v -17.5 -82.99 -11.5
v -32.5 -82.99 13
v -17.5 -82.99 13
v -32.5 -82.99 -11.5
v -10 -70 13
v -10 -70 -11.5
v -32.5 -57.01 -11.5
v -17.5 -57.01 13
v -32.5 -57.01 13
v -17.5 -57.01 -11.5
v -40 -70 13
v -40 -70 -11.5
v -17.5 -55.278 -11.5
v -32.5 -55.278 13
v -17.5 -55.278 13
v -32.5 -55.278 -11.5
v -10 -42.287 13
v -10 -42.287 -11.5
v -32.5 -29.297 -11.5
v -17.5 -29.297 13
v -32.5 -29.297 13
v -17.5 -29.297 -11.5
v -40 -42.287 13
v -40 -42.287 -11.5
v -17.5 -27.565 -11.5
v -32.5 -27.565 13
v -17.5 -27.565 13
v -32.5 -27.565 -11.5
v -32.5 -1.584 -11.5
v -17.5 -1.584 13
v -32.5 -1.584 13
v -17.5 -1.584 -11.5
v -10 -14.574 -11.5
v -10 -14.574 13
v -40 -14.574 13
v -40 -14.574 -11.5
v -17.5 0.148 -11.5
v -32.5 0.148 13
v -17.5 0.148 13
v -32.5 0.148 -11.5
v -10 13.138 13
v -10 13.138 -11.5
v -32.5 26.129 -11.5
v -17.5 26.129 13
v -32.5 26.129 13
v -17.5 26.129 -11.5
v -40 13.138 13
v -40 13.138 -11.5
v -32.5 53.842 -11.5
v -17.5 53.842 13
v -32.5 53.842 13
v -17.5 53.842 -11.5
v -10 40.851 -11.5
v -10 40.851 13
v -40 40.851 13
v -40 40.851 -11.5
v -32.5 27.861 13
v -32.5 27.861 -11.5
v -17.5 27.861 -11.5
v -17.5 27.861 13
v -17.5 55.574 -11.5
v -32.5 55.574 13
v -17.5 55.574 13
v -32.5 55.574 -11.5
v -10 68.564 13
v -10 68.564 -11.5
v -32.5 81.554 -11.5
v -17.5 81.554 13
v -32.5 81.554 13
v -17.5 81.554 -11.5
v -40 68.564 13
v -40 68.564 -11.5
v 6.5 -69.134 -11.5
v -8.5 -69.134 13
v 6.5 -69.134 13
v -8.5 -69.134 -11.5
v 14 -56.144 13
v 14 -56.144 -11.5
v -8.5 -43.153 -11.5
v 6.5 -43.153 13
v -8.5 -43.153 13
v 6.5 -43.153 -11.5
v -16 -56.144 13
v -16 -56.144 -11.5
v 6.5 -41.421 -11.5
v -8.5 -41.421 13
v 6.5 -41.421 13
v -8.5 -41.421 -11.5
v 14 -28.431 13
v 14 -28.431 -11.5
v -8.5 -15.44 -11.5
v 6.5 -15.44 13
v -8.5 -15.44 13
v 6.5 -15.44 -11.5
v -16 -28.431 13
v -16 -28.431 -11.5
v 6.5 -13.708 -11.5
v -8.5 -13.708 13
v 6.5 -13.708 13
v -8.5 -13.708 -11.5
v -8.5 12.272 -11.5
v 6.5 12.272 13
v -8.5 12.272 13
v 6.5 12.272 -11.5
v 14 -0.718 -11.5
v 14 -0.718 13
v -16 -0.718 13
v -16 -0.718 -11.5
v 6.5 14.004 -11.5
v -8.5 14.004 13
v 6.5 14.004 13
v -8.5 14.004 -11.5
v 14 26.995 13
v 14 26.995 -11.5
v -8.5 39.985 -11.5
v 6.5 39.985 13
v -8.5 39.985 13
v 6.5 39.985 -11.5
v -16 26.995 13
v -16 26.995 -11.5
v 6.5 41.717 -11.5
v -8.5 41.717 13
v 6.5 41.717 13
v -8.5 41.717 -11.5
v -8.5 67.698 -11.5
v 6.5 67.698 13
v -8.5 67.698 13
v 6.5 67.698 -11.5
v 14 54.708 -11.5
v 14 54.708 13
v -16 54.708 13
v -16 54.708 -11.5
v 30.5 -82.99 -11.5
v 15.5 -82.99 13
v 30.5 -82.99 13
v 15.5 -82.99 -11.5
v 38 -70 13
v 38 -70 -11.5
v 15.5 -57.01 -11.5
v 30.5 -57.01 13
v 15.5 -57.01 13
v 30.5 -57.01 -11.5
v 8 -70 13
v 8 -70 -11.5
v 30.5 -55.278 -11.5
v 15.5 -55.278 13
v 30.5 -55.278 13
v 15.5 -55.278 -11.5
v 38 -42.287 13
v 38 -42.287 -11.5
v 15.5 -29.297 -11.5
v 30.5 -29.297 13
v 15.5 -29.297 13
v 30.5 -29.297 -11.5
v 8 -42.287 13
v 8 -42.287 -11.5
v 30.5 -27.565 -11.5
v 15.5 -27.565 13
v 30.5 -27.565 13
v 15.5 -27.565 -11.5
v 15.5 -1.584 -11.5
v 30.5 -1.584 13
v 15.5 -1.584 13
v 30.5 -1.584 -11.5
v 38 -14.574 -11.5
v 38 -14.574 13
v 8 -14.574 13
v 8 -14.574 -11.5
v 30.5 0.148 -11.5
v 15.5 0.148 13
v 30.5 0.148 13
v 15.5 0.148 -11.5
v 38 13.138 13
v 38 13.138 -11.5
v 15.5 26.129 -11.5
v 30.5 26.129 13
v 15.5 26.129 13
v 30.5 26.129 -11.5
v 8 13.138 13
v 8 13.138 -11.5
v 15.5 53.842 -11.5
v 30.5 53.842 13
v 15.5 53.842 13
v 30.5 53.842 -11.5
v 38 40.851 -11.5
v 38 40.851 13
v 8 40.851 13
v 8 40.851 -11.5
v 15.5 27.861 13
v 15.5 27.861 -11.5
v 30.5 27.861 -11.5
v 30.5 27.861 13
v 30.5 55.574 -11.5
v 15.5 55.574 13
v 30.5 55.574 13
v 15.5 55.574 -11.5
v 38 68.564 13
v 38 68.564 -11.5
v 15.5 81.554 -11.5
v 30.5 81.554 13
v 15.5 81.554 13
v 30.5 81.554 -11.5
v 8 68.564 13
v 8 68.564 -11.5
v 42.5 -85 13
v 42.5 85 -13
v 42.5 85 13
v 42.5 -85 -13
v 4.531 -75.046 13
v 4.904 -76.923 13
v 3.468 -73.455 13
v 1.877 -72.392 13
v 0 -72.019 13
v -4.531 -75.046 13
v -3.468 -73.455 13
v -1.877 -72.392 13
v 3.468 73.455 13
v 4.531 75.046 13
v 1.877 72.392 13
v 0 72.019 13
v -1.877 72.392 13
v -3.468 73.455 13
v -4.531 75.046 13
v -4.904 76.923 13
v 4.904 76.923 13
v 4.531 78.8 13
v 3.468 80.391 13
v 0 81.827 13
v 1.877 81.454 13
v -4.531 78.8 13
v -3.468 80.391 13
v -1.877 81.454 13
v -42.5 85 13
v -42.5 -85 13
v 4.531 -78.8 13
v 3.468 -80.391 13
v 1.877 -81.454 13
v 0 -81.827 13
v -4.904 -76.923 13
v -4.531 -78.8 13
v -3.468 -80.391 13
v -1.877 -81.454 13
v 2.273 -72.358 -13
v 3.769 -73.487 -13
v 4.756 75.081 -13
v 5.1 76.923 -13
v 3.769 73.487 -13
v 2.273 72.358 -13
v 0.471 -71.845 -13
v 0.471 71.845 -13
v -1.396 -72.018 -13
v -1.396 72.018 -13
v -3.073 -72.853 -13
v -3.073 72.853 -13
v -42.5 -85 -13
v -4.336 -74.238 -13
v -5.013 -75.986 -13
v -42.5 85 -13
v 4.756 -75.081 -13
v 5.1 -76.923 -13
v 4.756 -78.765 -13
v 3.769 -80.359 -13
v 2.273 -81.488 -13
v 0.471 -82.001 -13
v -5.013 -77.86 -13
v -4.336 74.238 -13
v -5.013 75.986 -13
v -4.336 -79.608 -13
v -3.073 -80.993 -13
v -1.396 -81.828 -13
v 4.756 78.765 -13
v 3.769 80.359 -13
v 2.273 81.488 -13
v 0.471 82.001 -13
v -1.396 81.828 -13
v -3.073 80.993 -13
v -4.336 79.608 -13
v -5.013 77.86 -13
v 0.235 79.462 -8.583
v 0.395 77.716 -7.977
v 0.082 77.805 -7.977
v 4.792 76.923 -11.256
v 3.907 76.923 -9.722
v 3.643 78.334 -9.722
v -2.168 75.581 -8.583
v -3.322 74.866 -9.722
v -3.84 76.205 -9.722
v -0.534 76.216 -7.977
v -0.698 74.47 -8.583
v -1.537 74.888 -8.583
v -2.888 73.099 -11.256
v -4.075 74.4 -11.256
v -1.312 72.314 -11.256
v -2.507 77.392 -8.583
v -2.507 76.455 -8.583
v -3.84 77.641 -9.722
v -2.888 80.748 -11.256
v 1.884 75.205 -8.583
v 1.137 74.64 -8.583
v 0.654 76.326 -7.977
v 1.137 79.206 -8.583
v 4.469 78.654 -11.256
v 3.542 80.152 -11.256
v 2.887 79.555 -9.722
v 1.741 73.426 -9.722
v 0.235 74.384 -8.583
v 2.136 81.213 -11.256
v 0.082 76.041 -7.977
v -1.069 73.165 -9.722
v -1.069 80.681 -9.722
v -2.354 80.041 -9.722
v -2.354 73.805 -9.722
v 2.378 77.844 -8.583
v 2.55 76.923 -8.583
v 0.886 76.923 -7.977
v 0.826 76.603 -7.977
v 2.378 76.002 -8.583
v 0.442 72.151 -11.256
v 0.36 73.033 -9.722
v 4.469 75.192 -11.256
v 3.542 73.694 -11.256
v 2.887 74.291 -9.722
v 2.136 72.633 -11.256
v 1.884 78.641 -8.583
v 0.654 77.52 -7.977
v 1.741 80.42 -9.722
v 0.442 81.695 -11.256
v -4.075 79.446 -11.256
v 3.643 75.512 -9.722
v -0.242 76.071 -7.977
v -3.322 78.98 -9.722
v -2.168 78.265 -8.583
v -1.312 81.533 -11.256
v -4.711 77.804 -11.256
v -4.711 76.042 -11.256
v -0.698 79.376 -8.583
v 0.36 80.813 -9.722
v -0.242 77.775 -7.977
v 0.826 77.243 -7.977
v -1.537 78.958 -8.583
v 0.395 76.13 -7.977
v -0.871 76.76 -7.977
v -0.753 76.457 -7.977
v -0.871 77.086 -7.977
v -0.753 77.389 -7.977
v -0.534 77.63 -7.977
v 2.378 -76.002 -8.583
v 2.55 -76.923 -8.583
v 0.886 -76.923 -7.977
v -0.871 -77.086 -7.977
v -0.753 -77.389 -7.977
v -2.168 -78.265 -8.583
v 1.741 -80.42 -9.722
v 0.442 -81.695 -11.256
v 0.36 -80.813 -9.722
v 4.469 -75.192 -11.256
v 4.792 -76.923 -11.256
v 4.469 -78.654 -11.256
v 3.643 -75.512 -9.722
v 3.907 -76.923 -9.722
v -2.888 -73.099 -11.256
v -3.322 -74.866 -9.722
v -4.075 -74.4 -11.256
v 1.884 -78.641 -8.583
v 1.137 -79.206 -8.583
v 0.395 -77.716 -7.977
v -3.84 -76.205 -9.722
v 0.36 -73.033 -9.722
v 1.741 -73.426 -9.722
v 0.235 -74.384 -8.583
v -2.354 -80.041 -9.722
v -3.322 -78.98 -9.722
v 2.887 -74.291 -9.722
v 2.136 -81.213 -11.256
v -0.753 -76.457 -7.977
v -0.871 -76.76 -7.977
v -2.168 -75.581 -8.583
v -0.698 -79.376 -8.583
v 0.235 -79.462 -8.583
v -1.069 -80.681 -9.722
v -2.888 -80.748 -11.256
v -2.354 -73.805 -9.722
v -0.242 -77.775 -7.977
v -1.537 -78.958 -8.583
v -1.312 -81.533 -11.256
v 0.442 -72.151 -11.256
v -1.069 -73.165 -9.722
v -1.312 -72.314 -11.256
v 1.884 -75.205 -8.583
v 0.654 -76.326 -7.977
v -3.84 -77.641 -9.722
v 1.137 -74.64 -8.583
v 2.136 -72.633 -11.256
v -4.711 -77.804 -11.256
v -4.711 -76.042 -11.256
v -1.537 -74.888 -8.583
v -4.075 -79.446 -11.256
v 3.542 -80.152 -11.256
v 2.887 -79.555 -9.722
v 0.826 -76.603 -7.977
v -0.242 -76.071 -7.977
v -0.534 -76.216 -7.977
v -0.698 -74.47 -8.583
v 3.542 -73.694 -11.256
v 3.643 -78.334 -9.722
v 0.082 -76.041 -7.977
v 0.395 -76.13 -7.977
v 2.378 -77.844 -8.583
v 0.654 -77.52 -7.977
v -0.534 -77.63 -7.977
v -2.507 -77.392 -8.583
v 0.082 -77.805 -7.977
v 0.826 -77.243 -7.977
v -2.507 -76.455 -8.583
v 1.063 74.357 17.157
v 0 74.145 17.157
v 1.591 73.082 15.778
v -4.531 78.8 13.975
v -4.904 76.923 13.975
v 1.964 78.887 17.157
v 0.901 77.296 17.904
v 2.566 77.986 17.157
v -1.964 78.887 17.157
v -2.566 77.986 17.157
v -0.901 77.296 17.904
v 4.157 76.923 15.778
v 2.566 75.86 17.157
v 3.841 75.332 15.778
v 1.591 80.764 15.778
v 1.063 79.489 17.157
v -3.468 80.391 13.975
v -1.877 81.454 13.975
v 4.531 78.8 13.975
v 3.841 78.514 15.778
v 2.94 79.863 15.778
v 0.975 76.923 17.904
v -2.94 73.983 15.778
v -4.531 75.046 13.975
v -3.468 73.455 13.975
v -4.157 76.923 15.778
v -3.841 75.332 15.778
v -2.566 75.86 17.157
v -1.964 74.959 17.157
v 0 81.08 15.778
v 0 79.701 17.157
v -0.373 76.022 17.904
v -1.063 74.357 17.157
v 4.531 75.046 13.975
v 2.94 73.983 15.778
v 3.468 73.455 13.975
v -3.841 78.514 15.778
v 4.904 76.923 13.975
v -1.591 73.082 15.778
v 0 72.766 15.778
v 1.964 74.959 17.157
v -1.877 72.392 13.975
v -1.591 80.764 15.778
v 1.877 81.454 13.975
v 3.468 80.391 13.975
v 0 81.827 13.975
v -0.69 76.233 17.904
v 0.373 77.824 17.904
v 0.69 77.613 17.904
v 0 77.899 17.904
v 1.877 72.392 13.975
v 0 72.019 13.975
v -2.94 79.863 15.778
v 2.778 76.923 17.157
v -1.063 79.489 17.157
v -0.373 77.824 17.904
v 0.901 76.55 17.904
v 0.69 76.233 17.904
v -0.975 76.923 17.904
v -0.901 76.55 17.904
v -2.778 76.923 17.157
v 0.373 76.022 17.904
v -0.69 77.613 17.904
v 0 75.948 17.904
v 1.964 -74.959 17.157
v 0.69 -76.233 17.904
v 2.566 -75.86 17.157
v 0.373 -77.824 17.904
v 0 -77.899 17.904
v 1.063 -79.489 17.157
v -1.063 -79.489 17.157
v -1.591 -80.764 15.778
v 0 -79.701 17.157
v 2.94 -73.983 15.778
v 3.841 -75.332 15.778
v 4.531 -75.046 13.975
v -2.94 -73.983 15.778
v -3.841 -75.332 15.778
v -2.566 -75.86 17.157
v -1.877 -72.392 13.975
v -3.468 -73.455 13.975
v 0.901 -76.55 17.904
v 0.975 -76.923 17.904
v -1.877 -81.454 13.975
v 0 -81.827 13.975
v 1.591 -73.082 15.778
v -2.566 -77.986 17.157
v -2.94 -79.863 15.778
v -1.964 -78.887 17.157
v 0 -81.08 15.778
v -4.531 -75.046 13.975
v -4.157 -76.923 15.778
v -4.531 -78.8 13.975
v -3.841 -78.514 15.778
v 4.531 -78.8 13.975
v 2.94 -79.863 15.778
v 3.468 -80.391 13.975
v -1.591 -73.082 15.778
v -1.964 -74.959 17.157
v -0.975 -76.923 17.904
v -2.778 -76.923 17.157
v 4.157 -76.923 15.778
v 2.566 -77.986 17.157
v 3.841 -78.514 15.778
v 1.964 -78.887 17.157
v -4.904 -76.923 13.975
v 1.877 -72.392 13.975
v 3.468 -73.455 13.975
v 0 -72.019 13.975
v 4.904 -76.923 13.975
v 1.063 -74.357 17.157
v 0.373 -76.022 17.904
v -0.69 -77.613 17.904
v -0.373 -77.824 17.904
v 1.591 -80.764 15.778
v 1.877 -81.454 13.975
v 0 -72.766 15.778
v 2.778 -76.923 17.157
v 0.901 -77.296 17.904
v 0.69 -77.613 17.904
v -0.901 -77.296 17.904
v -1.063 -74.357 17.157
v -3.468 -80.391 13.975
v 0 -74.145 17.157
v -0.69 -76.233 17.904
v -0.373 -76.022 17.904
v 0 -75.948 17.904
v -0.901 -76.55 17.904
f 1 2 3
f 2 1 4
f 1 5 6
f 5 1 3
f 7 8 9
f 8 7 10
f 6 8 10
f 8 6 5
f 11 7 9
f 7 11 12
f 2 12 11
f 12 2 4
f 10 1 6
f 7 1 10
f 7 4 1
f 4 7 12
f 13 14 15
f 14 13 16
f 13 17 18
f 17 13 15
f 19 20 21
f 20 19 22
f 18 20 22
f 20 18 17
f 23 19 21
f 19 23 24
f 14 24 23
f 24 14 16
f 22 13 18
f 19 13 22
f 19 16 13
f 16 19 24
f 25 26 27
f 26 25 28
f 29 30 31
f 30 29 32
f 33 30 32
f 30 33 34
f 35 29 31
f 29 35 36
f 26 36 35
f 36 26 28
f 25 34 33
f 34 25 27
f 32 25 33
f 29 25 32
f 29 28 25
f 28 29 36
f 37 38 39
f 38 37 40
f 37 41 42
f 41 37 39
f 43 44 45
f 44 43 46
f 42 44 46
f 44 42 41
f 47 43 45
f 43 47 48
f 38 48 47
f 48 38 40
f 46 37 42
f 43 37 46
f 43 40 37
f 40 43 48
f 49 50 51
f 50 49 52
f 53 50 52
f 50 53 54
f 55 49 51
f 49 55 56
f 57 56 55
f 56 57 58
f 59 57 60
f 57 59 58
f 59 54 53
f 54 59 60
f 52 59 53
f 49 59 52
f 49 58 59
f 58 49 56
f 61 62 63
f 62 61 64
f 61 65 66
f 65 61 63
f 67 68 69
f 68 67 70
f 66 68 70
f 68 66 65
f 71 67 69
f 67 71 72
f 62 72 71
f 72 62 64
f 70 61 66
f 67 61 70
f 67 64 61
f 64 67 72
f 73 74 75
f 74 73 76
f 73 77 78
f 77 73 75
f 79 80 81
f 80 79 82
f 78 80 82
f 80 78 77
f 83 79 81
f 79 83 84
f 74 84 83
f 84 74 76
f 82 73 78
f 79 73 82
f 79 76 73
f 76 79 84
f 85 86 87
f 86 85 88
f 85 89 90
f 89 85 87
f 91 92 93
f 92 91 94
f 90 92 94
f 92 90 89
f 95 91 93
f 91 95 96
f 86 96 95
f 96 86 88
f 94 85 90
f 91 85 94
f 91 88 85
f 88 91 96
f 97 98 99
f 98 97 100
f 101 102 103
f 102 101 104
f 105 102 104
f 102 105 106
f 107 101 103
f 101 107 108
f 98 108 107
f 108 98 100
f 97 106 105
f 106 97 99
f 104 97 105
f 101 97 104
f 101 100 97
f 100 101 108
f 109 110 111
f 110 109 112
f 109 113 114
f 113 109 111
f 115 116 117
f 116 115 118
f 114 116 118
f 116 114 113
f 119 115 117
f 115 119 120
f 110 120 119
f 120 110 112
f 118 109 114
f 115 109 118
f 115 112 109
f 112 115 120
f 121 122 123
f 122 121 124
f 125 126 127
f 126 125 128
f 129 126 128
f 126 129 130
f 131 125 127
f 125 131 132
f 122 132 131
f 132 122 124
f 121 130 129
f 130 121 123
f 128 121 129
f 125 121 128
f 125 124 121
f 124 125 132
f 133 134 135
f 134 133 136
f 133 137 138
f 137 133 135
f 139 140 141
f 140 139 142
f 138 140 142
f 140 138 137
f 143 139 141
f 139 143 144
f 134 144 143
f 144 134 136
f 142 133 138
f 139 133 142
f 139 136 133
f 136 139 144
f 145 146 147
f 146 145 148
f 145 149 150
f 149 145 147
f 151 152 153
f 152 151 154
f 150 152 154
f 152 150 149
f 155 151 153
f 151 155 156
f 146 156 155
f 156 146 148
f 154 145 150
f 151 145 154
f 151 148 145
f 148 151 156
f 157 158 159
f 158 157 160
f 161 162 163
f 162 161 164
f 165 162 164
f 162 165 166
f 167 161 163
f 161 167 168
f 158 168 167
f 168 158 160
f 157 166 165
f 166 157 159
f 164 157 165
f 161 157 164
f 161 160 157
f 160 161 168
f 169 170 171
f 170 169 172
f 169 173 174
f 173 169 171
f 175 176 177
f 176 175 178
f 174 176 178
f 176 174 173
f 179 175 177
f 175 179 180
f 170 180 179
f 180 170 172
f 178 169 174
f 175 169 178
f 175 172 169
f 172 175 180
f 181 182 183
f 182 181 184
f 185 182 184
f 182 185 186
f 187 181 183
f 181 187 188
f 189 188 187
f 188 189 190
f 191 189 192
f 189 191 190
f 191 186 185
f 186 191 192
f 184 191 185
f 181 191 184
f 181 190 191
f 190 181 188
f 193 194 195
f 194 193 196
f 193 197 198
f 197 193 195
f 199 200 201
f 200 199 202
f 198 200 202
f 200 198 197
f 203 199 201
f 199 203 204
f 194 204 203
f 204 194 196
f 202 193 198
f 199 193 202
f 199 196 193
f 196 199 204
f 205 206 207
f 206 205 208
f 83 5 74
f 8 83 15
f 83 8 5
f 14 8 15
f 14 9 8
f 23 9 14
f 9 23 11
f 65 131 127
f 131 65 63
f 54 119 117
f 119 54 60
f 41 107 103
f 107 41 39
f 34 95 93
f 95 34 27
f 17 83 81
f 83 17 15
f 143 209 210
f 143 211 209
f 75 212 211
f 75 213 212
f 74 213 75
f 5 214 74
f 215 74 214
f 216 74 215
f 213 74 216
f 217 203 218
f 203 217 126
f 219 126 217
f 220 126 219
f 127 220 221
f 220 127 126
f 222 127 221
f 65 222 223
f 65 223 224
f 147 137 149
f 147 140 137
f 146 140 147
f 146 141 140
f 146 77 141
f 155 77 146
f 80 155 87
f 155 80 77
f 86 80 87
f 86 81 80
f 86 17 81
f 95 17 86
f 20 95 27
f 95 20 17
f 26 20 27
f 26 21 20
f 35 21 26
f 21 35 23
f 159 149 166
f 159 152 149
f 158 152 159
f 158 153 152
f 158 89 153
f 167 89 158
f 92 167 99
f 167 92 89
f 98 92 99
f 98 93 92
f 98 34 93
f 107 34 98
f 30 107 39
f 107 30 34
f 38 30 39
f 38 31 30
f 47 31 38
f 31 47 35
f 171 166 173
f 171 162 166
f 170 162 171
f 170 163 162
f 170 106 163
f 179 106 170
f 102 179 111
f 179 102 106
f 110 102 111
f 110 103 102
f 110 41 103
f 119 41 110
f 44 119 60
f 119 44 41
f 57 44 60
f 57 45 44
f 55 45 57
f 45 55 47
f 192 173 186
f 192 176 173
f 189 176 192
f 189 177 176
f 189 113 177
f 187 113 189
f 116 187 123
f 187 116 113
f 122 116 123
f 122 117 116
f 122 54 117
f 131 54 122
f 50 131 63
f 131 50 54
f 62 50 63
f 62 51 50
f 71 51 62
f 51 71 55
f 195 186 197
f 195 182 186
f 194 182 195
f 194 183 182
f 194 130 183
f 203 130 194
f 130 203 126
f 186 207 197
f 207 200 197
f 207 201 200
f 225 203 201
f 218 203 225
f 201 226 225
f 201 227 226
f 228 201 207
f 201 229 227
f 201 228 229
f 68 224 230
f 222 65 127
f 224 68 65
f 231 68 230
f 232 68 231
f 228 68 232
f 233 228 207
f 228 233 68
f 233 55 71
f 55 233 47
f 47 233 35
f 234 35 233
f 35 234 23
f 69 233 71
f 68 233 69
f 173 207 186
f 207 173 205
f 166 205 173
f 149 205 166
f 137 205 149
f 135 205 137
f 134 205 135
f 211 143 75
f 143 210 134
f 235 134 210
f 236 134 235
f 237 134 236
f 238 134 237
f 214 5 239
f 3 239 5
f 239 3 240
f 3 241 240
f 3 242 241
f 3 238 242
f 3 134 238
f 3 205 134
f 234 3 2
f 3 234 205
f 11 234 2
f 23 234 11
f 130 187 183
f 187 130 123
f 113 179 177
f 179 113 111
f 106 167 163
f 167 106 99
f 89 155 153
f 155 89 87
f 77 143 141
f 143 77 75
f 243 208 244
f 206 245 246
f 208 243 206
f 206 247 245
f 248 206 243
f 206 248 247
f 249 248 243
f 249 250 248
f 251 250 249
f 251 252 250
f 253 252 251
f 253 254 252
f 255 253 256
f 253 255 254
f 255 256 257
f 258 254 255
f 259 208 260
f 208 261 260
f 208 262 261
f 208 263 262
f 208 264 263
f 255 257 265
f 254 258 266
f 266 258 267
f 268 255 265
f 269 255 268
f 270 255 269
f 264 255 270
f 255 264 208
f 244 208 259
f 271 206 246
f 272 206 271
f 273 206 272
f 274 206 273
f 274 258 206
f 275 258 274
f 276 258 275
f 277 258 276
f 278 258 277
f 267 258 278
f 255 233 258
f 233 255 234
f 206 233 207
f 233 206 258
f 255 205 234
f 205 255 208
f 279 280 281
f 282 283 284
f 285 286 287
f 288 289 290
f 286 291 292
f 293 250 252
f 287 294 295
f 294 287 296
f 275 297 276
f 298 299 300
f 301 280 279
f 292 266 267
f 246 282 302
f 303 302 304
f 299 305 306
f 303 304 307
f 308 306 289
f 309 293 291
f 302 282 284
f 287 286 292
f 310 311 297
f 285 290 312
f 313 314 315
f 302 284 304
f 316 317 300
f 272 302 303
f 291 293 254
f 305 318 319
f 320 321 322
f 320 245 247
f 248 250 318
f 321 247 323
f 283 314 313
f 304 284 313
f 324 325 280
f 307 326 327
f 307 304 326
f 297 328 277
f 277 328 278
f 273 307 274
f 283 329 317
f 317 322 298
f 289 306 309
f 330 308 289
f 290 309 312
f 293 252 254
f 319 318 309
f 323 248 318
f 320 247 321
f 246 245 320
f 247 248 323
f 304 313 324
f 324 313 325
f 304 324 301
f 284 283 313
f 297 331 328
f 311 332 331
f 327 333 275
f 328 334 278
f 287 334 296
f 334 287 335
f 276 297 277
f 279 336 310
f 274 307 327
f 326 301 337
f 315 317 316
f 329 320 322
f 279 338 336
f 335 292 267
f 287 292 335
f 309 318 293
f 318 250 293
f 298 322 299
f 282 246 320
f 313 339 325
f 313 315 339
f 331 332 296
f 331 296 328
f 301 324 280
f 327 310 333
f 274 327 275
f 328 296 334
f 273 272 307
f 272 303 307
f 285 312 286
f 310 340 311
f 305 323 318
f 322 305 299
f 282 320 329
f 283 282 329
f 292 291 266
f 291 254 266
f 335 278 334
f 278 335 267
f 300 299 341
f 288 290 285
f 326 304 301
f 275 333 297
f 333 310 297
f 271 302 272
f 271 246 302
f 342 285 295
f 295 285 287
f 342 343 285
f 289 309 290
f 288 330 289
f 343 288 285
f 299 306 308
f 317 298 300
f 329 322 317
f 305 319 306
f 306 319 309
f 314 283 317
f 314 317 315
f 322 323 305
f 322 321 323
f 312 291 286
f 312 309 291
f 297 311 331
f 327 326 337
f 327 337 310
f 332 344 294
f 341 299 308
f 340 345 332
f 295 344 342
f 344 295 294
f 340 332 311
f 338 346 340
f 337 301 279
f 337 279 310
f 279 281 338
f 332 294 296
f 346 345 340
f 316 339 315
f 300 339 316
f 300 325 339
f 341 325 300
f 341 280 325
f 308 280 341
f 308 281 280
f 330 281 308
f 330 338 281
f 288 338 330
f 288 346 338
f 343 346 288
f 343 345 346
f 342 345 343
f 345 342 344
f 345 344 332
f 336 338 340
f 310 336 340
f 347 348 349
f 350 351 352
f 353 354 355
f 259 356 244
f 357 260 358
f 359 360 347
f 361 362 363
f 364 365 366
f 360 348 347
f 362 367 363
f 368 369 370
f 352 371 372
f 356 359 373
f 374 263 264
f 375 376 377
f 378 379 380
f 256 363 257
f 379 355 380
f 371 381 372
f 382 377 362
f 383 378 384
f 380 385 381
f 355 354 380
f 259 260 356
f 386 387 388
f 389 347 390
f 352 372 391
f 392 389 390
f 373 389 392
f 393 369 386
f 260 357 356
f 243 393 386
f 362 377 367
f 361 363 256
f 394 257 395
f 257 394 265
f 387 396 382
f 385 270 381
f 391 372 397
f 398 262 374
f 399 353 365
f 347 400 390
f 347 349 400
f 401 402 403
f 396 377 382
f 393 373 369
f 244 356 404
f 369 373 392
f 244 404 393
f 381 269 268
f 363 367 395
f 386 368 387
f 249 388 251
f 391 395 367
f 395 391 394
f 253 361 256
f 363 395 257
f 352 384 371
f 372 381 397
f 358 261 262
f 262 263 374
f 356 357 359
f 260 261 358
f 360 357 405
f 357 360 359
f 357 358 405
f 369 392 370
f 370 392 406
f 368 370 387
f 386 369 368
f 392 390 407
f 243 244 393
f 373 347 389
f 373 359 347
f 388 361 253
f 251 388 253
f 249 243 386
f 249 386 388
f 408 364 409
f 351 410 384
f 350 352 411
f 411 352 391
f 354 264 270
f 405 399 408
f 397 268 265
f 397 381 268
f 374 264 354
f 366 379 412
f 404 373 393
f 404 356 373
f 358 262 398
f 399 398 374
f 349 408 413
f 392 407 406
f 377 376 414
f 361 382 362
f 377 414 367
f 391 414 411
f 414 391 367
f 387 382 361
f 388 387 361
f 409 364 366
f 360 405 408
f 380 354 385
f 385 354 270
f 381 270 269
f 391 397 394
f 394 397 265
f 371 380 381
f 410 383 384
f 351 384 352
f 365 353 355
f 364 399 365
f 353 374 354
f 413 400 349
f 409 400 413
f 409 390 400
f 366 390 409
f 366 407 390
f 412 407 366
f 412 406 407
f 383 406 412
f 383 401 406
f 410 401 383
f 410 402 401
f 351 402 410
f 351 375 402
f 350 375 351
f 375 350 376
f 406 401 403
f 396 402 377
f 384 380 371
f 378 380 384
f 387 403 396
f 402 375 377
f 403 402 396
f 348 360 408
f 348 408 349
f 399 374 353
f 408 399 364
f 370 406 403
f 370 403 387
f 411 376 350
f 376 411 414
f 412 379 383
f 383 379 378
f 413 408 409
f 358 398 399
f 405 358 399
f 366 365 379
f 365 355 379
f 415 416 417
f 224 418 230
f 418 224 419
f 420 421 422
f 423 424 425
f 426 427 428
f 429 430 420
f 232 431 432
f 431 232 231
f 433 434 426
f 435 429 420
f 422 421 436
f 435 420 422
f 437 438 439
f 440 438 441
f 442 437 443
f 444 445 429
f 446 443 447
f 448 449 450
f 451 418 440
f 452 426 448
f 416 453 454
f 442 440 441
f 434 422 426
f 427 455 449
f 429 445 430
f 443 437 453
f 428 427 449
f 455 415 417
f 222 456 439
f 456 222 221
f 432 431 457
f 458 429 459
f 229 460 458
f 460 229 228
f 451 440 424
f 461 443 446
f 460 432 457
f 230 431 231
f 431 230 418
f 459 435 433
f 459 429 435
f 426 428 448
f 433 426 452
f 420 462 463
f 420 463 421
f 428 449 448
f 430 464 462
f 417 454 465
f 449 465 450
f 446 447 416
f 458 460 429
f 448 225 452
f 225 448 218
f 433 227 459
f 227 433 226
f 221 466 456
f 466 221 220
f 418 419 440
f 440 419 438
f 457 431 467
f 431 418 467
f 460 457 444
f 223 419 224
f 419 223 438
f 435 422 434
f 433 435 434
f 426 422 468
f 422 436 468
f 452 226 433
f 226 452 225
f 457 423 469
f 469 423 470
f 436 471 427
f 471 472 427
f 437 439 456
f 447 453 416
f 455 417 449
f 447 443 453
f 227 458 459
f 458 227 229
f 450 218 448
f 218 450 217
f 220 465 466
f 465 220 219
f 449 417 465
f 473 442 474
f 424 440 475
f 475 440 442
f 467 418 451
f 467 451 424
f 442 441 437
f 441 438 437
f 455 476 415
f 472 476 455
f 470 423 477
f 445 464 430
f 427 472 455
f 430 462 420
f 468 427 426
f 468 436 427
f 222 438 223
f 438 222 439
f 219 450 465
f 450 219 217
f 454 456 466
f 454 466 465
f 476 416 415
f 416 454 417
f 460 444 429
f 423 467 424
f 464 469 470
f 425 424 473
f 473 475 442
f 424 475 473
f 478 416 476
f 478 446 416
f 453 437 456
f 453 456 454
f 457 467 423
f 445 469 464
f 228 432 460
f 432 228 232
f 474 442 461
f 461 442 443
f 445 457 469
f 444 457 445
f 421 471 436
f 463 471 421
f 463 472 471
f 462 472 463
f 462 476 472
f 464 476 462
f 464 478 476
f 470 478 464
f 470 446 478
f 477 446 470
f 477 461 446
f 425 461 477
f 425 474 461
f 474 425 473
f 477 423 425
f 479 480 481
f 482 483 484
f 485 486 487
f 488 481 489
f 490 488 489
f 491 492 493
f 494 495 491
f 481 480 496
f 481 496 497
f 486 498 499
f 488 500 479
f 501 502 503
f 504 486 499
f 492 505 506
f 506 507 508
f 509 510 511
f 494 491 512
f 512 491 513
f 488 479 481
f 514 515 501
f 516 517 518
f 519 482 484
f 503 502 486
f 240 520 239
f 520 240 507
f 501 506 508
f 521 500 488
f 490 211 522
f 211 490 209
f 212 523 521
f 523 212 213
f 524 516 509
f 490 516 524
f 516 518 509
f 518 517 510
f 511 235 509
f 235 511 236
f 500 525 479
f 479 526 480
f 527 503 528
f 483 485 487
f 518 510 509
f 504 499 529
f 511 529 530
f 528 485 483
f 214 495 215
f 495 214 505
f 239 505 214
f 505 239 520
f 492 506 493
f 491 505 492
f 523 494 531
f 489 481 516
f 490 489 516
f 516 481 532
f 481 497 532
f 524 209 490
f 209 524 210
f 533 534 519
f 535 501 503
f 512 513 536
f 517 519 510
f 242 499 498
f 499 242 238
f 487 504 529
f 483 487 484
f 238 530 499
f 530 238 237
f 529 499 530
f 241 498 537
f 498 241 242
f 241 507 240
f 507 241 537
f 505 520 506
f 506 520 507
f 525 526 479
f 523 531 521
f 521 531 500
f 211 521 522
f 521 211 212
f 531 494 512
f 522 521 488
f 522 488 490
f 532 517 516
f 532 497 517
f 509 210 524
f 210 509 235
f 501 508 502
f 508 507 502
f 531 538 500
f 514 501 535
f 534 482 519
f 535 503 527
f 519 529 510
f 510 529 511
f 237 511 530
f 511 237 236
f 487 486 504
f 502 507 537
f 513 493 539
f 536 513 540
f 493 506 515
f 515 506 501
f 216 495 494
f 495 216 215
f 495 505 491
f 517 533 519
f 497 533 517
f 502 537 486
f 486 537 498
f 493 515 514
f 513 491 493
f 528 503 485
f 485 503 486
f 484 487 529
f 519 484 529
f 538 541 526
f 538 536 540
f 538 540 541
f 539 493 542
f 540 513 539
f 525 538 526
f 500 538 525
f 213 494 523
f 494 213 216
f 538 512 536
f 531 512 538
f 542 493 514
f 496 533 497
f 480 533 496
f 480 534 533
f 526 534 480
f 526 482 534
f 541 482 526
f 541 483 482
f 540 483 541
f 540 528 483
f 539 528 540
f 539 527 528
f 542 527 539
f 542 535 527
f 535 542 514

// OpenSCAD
//@Name: Dice Tray
//@Description: A simple tray with hexagonal dividers
//@Author: Yurre
//@Version: 1

/*[params]*/

hexTray(100, 180, 26);

module hexTray(trayX = 100, trayY = 180, trayZ = 31){
    union(){
        difference(){
            cube([trayX - 15, trayY - 10, trayZ], center = true);
            translate([-(trayX / 4),-(trayY / (180 / 70)),1]){
            hexPattern(trayY, trayX, trayZ - 1, 15, 1);
            }
        translate([0, trayX /1.3,-trayZ / 2]){
            sphere(d = 10.2);
        }
        translate([0, -trayX /1.3,-trayZ / 2]){
            sphere(d = 10.2);
        }
        }
        translate([0, trayX /1.3,trayZ / 2]){
            sphere(d = 10);
        }
        translate([0, -trayX /1.3,trayZ / 2]){
            sphere(d = 10);
        }
    }
}

module hexPattern(X, Y, Z, hexD, pattW, inverted = false){
    xAmount = floor(X / (2*hexD));
    yAmount = floor(Y / (2*hexD));
    oHexD = hexD + pattW;
    echo("hexagonals on X = ", xAmount, "and on Y =", yAmount);
    for(i = [0 : yAmount - 1]){
        if((i % 2) == 1){
            translate([i * ((3/2) * oHexD), (i % 2) * ((sqrt(3) * oHexD) / 2), 0]){
                if(inverted){
                    for(j = [0 : xAmount - 2]){
                        echo("loop: ", j);
                        translate([0,j *(sqrt(3) * oHexD), 0]){
                            difference(){
                                hexagon(oHexD, Z);
                                hexagon(hexD, Z + 1);
                            }
                        }
                    }
                } else {
                    for(j = [0 : xAmount - 2]){
                        echo("loop: ", j);
                        translate([0,j *(sqrt(3) * oHexD), 0]){
                            hexagon(hexD, Z);
                        }
                    }
                }
            }
        } else {
            translate([i * ((3/2) * oHexD), -(i % 2) * ((sqrt(3) * oHexD) / 2), 0]){
                if(inverted){
                    for(j = [0 : xAmount - 1]){
                        echo("loop: ", j);
                        translate([0,j *(sqrt(3) * oHexD), 0]){
                            difference(){
                                hexagon(oHexD, Z);
                                hexagon(hexD, Z + 1);
                            }
                        }
                    }
                } else {
                    for(j = [0 : xAmount - 1]){
                        echo("loop: ", j);
                        translate([0,j *(sqrt(3) * oHexD), 0]){
                            hexagon(hexD, Z);
                        }
                    }
                }
            }
        }
    }
}

module hexagon(diameter, height, center = true){
    cylinder(h = height, r = diameter, center = center, $fn = 6);
}
